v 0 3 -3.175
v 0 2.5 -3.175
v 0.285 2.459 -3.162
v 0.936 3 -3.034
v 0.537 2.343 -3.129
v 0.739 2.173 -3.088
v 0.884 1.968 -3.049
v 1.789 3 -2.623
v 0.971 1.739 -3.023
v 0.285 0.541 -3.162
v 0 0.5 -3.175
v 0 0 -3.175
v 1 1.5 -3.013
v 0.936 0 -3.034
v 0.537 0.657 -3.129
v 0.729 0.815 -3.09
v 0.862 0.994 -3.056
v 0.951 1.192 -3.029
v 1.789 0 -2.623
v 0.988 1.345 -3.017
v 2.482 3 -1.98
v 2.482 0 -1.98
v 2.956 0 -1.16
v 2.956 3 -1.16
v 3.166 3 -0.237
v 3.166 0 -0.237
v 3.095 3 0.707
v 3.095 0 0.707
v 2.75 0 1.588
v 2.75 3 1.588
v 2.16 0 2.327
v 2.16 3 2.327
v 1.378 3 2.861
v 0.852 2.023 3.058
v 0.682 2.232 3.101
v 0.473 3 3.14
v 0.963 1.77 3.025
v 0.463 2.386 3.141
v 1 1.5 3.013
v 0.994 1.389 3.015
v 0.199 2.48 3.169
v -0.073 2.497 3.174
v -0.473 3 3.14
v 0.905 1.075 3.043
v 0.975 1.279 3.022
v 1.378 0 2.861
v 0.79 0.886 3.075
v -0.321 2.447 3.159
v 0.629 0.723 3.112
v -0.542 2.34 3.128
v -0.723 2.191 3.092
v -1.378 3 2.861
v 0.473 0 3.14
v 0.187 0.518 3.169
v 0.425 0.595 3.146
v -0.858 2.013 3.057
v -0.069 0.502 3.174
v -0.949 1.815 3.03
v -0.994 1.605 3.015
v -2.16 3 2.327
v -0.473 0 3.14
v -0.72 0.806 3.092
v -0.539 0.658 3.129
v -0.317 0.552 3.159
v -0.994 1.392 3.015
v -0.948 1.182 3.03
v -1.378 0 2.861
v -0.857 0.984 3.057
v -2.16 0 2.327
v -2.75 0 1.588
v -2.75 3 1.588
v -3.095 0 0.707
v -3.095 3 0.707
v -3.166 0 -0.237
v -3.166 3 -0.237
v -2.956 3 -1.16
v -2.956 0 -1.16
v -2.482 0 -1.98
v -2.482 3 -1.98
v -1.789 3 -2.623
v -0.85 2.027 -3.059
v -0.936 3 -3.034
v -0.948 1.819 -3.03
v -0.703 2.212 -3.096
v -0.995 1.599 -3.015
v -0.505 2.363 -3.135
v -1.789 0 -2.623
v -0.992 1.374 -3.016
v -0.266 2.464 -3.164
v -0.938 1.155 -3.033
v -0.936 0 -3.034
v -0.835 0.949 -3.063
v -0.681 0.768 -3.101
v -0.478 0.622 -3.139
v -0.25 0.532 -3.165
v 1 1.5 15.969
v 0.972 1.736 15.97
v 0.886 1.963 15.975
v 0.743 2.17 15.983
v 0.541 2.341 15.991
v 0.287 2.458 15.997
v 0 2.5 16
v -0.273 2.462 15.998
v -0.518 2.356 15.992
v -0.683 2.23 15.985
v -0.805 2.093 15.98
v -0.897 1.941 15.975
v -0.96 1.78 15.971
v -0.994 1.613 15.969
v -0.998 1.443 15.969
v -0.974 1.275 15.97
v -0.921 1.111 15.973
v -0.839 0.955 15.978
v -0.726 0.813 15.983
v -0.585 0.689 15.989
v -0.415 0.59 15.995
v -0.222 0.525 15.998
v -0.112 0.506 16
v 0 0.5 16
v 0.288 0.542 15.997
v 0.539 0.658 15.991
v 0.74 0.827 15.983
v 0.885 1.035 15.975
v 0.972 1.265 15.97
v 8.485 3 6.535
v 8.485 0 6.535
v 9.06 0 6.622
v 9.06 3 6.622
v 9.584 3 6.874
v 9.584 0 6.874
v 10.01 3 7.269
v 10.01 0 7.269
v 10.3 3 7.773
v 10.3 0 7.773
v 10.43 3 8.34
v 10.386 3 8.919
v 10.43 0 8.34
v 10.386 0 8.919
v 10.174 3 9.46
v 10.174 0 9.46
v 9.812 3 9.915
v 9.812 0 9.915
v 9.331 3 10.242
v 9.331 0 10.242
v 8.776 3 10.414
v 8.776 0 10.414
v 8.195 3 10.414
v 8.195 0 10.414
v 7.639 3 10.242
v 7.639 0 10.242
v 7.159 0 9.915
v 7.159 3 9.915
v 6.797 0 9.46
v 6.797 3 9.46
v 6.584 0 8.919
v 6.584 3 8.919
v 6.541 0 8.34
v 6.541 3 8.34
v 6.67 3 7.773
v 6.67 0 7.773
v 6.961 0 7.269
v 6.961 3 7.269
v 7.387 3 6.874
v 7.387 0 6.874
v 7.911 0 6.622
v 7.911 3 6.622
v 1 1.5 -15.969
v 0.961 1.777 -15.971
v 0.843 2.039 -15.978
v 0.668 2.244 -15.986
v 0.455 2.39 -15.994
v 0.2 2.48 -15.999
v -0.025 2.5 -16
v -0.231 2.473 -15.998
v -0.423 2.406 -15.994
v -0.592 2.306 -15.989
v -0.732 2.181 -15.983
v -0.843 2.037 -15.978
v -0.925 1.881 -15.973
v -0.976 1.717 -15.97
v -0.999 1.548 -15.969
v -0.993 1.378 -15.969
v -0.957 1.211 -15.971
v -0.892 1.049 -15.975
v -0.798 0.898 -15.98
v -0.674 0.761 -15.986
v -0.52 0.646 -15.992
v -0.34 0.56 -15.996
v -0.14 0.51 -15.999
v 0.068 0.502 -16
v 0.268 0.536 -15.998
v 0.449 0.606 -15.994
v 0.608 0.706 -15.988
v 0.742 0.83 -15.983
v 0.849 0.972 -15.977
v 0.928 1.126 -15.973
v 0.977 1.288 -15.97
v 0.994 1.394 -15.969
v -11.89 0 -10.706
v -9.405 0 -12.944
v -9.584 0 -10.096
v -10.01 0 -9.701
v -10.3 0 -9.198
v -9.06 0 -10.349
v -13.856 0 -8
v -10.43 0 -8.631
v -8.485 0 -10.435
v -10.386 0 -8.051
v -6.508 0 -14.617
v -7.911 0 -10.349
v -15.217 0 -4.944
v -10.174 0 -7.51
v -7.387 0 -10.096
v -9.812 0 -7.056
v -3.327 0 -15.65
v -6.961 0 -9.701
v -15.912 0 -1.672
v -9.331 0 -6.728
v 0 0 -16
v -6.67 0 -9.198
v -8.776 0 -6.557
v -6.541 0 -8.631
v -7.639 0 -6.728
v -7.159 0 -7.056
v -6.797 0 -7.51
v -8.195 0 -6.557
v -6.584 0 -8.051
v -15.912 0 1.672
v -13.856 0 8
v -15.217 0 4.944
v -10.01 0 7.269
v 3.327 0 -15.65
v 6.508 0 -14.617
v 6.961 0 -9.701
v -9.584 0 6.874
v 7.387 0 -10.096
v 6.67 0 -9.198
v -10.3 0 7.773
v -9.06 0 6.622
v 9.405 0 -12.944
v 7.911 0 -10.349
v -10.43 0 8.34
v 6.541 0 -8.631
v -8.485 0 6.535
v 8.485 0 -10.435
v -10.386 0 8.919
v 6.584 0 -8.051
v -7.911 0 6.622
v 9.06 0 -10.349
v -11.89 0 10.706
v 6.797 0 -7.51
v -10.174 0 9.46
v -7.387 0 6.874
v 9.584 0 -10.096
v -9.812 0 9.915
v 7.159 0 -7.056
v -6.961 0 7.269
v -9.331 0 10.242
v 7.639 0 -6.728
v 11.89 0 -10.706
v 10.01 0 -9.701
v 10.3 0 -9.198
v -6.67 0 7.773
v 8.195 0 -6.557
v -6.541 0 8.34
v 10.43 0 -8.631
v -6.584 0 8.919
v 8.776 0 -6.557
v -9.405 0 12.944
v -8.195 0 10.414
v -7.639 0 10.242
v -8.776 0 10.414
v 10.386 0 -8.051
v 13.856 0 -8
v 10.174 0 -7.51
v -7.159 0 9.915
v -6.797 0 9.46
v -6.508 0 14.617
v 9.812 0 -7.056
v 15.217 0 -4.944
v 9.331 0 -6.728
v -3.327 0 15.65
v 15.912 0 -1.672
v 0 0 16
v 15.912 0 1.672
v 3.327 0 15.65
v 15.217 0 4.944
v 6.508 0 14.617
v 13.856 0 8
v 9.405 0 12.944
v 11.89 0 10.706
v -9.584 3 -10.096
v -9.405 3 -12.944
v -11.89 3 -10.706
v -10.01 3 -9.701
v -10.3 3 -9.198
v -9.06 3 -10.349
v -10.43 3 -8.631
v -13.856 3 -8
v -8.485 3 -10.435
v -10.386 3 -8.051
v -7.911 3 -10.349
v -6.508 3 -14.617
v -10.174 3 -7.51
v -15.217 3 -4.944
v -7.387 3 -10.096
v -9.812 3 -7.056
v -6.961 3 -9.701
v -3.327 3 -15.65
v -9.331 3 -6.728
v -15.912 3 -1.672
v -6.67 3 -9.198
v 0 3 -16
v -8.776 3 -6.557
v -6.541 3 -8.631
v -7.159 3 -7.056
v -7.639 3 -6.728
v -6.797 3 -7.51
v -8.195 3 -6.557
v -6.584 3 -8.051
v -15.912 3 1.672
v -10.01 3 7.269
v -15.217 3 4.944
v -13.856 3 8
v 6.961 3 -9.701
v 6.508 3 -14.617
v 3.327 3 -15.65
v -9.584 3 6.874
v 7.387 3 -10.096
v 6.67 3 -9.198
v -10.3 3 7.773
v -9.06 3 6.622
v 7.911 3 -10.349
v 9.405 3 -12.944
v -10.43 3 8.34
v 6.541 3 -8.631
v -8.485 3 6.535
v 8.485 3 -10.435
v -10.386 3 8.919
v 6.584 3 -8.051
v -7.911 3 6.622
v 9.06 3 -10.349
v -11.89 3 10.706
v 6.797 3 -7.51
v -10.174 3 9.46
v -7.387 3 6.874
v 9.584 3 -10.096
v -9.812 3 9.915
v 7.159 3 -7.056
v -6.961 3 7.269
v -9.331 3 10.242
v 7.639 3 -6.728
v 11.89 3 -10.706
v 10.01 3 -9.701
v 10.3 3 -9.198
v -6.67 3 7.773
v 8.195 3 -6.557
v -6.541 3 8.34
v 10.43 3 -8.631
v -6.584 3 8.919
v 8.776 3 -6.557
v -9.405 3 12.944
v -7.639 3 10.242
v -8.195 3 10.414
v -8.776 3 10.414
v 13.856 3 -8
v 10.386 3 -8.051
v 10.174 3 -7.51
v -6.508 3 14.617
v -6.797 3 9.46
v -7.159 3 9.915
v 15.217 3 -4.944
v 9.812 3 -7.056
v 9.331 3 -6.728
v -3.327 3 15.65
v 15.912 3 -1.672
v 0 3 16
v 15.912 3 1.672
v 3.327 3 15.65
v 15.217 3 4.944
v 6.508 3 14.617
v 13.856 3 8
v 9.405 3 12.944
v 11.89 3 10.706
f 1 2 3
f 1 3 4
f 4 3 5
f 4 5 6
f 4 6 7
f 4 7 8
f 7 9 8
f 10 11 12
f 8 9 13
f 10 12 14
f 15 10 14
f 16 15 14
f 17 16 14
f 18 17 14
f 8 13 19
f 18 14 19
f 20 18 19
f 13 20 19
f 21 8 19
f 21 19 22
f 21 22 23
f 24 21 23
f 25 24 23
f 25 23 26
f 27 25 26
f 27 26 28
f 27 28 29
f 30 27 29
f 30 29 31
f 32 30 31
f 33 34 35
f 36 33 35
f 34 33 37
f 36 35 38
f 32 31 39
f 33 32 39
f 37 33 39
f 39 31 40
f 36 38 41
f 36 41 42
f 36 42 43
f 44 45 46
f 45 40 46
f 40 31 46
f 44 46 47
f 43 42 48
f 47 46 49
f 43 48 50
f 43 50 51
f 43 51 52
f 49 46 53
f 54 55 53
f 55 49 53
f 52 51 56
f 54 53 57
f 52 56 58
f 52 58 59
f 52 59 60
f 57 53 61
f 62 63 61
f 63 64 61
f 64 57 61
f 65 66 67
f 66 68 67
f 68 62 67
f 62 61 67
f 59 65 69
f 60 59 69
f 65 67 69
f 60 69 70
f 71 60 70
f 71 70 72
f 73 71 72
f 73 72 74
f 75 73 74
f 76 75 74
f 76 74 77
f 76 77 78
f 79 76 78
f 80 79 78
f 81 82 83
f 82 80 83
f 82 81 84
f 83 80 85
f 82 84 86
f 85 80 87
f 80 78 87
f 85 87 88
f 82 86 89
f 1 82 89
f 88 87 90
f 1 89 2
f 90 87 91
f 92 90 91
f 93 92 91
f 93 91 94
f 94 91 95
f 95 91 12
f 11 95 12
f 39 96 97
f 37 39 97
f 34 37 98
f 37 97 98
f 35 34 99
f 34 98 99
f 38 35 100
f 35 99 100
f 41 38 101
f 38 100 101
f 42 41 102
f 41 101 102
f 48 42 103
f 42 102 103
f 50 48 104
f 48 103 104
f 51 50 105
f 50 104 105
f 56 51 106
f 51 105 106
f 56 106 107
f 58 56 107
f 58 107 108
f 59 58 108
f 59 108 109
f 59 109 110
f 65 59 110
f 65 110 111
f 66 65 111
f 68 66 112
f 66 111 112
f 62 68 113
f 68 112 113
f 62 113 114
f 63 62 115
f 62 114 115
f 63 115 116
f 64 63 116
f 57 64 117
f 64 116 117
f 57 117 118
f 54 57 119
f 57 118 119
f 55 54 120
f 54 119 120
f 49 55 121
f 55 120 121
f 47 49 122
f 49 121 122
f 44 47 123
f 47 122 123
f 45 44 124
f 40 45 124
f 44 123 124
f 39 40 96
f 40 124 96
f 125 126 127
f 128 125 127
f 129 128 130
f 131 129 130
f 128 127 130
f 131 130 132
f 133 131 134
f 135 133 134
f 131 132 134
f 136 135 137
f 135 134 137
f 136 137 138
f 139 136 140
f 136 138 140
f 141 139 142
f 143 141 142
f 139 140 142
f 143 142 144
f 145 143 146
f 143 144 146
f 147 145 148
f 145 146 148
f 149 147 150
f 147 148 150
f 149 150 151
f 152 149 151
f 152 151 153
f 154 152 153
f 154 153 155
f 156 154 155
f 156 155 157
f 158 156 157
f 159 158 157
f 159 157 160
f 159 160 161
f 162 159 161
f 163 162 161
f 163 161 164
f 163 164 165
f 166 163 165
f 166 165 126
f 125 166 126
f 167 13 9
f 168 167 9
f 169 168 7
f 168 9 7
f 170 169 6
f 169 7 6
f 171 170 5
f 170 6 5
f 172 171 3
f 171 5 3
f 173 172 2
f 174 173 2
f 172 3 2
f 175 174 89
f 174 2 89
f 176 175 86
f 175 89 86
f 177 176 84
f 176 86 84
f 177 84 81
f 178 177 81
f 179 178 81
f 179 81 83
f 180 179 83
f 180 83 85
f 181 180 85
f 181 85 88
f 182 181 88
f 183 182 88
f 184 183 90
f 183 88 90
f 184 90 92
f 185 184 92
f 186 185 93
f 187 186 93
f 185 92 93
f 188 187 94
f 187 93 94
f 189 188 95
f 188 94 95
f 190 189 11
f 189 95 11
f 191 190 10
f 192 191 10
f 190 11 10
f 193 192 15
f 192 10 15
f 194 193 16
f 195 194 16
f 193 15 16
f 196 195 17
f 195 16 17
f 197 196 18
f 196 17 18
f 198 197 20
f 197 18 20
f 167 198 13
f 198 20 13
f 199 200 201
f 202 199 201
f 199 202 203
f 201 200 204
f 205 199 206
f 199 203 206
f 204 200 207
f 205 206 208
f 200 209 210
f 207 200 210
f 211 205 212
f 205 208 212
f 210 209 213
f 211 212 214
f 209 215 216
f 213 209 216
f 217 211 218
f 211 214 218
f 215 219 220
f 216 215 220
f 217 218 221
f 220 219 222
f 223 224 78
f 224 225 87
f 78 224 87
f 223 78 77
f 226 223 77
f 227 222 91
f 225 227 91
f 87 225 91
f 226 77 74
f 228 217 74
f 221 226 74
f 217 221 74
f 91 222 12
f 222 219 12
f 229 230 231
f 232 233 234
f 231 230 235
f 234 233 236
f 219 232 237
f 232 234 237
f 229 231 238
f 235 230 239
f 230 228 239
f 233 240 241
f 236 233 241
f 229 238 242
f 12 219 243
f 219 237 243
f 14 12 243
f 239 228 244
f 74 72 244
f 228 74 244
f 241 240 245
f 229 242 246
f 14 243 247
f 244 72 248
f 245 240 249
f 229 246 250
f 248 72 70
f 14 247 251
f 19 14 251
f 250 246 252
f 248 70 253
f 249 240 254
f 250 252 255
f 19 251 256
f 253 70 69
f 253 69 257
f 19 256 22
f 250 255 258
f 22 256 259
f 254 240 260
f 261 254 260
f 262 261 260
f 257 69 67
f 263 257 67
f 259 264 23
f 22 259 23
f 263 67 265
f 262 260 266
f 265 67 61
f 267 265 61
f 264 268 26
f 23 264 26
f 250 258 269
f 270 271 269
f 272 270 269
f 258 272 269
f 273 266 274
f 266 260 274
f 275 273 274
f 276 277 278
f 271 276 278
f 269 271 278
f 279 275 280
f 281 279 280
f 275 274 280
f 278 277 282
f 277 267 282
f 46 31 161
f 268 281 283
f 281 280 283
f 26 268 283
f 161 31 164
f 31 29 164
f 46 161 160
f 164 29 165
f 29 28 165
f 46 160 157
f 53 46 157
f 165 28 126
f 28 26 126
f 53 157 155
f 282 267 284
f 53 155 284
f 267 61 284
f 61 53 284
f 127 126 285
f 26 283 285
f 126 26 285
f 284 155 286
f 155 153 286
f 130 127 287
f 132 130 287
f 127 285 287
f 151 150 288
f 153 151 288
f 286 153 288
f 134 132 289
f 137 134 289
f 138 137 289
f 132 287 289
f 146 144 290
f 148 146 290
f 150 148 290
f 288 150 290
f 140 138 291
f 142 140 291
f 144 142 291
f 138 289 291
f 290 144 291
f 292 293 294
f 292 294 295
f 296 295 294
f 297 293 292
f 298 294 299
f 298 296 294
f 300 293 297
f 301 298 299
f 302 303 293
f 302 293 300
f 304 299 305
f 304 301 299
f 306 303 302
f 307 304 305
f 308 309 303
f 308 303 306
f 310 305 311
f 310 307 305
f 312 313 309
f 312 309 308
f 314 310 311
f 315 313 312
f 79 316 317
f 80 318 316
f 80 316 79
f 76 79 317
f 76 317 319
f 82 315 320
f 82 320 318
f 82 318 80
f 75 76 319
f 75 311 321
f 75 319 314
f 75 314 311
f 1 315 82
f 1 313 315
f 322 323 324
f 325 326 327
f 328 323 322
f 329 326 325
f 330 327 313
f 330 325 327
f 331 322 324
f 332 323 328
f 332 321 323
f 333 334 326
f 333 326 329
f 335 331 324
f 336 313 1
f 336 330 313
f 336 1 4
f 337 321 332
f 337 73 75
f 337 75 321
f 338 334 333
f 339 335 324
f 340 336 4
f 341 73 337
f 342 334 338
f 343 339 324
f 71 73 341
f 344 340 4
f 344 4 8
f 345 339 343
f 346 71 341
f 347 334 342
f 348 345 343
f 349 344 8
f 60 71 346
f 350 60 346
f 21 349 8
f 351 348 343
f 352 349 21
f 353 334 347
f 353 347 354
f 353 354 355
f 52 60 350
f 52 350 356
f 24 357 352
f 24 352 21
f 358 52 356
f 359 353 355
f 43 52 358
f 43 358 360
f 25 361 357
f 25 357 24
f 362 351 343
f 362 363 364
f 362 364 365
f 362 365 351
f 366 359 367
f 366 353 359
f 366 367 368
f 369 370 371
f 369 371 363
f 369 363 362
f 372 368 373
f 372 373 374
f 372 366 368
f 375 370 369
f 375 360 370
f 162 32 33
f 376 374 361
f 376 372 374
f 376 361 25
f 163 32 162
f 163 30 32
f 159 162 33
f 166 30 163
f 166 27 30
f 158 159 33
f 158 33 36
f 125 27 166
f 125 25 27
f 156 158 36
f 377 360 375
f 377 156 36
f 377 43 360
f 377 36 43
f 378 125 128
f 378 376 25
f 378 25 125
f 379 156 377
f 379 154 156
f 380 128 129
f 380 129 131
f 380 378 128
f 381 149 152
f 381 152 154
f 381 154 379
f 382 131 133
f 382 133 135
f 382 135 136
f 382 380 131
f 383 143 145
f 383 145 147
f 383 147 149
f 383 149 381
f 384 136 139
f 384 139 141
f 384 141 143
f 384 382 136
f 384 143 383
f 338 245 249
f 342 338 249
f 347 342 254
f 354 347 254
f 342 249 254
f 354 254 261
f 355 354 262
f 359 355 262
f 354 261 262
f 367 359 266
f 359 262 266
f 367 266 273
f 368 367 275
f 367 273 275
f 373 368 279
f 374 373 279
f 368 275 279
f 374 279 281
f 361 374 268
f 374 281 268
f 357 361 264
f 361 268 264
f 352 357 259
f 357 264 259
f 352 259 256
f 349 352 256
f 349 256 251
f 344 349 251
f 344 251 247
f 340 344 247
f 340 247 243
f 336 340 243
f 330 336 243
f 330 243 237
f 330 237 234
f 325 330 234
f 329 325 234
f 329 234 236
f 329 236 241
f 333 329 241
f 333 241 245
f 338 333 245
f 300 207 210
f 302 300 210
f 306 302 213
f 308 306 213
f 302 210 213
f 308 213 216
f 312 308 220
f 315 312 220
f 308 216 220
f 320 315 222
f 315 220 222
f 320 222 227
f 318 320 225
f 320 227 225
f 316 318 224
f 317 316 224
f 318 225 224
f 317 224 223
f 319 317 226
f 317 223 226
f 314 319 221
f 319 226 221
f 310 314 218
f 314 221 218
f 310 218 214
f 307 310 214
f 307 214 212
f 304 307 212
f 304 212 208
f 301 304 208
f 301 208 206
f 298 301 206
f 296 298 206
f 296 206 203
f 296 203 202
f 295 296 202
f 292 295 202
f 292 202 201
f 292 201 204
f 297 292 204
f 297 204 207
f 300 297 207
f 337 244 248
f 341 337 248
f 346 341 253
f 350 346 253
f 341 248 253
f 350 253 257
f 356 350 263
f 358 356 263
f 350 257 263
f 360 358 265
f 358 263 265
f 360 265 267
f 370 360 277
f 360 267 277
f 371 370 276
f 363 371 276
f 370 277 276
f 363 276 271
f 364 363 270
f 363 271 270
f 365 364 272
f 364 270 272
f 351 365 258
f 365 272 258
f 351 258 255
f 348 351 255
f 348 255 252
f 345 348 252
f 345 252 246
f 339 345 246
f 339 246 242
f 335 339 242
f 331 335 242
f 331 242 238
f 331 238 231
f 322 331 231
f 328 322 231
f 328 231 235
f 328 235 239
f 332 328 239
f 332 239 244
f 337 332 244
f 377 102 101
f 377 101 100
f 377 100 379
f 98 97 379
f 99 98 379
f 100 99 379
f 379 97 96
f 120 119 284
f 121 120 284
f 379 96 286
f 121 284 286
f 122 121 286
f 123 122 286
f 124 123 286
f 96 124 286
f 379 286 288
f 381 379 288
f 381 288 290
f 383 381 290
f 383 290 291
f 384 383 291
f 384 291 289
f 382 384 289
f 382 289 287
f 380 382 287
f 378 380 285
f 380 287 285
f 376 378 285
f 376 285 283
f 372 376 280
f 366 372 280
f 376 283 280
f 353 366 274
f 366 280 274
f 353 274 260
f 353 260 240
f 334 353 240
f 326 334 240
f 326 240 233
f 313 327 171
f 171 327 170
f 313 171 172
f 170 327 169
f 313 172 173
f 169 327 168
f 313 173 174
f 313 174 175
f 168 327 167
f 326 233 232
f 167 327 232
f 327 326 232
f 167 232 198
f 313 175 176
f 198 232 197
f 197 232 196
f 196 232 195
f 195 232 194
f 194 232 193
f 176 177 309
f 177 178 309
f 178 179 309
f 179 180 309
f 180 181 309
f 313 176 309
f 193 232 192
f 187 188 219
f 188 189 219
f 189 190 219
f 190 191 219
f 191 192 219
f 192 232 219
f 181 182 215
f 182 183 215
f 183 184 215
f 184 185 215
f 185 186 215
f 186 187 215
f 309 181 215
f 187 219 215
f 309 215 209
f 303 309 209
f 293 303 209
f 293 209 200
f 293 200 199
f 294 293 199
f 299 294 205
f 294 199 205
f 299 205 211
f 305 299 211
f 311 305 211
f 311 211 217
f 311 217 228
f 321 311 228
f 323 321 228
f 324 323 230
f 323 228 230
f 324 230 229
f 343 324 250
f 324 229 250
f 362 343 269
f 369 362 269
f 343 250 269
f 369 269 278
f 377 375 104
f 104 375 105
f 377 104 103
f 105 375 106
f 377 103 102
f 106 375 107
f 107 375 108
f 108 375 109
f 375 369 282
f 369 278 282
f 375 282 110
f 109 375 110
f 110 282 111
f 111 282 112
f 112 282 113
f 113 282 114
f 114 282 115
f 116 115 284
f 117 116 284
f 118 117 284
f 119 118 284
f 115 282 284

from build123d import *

# Parameters (mm, degrees)
SKETCH1_R             = 16
BOSS_EXTRUDE1_DEPTH   = 3
F_3_0MM_DOWEL_HOLE1_D = 3.9
SKETCH6_R             = 3.175
CUT_EXTRUDE3_DEPTH    = 23.825424421
SKETCH14_R            = 1
CUT_EXTRUDE4_DEPTH    = 40
SKETCH7_R             = 1
CUT_EXTRUDE1_DEPTH    = 10.5
SKETCH11_R            = 1.9
CUT_EXTRUDE2_DEPTH    = 2


with BuildPart() as part:
    # Sketch1 → Boss-Extrude1 (new body)
    with BuildSketch(Plane(origin=(0, 0, 0), x_dir=(1, 0, 0), z_dir=(0, 1, 0))):
        with Locations(Location((0, 0, 0), (0, 0, 270))):
            Circle(SKETCH1_R)
    extrude(amount=BOSS_EXTRUDE1_DEPTH)

    # Ø3.0mm Dowel Hole1 (through all)
    with Locations(Plane(origin=(8.485281374, 3, 8.485281374), x_dir=(0, 0, 1), z_dir=(0, 1, 0))):
        with Locations((0, 0), (0, -16.970562748), (-16.970562748, -16.970562748), (-16.970562748, 0)):
            Hole(F_3_0MM_DOWEL_HOLE1_D / 2)

    # Sketch6 → Cut-Extrude3 (cut, through all)
    with BuildSketch(Plane.XZ):
        with Locations(Location((0, 0, 0), (0, 0, 270))):
            Circle(SKETCH6_R)
    extrude(amount=-CUT_EXTRUDE3_DEPTH, mode=Mode.SUBTRACT)

    # Sketch14 → Cut-Extrude4 (cut)
    with BuildSketch(Plane.XY.offset(16)):
        with Locations((0, 1.5)):
            Circle(SKETCH14_R)
    extrude(amount=-CUT_EXTRUDE4_DEPTH, mode=Mode.SUBTRACT)

    # Sketch7 → Cut-Extrude1 (cut)
    with BuildSketch(Plane.XY):
        with Locations((0, -5)):
            Circle(SKETCH7_R)
    extrude(amount=CUT_EXTRUDE1_DEPTH, mode=Mode.SUBTRACT)

    # Sketch11 → Cut-Extrude2 (cut)
    with BuildSketch(Plane.XY.offset(7)):
        with Locations((0, -5)):
            Circle(SKETCH11_R)
    extrude(amount=-CUT_EXTRUDE2_DEPTH, mode=Mode.SUBTRACT)


solid = part.part
